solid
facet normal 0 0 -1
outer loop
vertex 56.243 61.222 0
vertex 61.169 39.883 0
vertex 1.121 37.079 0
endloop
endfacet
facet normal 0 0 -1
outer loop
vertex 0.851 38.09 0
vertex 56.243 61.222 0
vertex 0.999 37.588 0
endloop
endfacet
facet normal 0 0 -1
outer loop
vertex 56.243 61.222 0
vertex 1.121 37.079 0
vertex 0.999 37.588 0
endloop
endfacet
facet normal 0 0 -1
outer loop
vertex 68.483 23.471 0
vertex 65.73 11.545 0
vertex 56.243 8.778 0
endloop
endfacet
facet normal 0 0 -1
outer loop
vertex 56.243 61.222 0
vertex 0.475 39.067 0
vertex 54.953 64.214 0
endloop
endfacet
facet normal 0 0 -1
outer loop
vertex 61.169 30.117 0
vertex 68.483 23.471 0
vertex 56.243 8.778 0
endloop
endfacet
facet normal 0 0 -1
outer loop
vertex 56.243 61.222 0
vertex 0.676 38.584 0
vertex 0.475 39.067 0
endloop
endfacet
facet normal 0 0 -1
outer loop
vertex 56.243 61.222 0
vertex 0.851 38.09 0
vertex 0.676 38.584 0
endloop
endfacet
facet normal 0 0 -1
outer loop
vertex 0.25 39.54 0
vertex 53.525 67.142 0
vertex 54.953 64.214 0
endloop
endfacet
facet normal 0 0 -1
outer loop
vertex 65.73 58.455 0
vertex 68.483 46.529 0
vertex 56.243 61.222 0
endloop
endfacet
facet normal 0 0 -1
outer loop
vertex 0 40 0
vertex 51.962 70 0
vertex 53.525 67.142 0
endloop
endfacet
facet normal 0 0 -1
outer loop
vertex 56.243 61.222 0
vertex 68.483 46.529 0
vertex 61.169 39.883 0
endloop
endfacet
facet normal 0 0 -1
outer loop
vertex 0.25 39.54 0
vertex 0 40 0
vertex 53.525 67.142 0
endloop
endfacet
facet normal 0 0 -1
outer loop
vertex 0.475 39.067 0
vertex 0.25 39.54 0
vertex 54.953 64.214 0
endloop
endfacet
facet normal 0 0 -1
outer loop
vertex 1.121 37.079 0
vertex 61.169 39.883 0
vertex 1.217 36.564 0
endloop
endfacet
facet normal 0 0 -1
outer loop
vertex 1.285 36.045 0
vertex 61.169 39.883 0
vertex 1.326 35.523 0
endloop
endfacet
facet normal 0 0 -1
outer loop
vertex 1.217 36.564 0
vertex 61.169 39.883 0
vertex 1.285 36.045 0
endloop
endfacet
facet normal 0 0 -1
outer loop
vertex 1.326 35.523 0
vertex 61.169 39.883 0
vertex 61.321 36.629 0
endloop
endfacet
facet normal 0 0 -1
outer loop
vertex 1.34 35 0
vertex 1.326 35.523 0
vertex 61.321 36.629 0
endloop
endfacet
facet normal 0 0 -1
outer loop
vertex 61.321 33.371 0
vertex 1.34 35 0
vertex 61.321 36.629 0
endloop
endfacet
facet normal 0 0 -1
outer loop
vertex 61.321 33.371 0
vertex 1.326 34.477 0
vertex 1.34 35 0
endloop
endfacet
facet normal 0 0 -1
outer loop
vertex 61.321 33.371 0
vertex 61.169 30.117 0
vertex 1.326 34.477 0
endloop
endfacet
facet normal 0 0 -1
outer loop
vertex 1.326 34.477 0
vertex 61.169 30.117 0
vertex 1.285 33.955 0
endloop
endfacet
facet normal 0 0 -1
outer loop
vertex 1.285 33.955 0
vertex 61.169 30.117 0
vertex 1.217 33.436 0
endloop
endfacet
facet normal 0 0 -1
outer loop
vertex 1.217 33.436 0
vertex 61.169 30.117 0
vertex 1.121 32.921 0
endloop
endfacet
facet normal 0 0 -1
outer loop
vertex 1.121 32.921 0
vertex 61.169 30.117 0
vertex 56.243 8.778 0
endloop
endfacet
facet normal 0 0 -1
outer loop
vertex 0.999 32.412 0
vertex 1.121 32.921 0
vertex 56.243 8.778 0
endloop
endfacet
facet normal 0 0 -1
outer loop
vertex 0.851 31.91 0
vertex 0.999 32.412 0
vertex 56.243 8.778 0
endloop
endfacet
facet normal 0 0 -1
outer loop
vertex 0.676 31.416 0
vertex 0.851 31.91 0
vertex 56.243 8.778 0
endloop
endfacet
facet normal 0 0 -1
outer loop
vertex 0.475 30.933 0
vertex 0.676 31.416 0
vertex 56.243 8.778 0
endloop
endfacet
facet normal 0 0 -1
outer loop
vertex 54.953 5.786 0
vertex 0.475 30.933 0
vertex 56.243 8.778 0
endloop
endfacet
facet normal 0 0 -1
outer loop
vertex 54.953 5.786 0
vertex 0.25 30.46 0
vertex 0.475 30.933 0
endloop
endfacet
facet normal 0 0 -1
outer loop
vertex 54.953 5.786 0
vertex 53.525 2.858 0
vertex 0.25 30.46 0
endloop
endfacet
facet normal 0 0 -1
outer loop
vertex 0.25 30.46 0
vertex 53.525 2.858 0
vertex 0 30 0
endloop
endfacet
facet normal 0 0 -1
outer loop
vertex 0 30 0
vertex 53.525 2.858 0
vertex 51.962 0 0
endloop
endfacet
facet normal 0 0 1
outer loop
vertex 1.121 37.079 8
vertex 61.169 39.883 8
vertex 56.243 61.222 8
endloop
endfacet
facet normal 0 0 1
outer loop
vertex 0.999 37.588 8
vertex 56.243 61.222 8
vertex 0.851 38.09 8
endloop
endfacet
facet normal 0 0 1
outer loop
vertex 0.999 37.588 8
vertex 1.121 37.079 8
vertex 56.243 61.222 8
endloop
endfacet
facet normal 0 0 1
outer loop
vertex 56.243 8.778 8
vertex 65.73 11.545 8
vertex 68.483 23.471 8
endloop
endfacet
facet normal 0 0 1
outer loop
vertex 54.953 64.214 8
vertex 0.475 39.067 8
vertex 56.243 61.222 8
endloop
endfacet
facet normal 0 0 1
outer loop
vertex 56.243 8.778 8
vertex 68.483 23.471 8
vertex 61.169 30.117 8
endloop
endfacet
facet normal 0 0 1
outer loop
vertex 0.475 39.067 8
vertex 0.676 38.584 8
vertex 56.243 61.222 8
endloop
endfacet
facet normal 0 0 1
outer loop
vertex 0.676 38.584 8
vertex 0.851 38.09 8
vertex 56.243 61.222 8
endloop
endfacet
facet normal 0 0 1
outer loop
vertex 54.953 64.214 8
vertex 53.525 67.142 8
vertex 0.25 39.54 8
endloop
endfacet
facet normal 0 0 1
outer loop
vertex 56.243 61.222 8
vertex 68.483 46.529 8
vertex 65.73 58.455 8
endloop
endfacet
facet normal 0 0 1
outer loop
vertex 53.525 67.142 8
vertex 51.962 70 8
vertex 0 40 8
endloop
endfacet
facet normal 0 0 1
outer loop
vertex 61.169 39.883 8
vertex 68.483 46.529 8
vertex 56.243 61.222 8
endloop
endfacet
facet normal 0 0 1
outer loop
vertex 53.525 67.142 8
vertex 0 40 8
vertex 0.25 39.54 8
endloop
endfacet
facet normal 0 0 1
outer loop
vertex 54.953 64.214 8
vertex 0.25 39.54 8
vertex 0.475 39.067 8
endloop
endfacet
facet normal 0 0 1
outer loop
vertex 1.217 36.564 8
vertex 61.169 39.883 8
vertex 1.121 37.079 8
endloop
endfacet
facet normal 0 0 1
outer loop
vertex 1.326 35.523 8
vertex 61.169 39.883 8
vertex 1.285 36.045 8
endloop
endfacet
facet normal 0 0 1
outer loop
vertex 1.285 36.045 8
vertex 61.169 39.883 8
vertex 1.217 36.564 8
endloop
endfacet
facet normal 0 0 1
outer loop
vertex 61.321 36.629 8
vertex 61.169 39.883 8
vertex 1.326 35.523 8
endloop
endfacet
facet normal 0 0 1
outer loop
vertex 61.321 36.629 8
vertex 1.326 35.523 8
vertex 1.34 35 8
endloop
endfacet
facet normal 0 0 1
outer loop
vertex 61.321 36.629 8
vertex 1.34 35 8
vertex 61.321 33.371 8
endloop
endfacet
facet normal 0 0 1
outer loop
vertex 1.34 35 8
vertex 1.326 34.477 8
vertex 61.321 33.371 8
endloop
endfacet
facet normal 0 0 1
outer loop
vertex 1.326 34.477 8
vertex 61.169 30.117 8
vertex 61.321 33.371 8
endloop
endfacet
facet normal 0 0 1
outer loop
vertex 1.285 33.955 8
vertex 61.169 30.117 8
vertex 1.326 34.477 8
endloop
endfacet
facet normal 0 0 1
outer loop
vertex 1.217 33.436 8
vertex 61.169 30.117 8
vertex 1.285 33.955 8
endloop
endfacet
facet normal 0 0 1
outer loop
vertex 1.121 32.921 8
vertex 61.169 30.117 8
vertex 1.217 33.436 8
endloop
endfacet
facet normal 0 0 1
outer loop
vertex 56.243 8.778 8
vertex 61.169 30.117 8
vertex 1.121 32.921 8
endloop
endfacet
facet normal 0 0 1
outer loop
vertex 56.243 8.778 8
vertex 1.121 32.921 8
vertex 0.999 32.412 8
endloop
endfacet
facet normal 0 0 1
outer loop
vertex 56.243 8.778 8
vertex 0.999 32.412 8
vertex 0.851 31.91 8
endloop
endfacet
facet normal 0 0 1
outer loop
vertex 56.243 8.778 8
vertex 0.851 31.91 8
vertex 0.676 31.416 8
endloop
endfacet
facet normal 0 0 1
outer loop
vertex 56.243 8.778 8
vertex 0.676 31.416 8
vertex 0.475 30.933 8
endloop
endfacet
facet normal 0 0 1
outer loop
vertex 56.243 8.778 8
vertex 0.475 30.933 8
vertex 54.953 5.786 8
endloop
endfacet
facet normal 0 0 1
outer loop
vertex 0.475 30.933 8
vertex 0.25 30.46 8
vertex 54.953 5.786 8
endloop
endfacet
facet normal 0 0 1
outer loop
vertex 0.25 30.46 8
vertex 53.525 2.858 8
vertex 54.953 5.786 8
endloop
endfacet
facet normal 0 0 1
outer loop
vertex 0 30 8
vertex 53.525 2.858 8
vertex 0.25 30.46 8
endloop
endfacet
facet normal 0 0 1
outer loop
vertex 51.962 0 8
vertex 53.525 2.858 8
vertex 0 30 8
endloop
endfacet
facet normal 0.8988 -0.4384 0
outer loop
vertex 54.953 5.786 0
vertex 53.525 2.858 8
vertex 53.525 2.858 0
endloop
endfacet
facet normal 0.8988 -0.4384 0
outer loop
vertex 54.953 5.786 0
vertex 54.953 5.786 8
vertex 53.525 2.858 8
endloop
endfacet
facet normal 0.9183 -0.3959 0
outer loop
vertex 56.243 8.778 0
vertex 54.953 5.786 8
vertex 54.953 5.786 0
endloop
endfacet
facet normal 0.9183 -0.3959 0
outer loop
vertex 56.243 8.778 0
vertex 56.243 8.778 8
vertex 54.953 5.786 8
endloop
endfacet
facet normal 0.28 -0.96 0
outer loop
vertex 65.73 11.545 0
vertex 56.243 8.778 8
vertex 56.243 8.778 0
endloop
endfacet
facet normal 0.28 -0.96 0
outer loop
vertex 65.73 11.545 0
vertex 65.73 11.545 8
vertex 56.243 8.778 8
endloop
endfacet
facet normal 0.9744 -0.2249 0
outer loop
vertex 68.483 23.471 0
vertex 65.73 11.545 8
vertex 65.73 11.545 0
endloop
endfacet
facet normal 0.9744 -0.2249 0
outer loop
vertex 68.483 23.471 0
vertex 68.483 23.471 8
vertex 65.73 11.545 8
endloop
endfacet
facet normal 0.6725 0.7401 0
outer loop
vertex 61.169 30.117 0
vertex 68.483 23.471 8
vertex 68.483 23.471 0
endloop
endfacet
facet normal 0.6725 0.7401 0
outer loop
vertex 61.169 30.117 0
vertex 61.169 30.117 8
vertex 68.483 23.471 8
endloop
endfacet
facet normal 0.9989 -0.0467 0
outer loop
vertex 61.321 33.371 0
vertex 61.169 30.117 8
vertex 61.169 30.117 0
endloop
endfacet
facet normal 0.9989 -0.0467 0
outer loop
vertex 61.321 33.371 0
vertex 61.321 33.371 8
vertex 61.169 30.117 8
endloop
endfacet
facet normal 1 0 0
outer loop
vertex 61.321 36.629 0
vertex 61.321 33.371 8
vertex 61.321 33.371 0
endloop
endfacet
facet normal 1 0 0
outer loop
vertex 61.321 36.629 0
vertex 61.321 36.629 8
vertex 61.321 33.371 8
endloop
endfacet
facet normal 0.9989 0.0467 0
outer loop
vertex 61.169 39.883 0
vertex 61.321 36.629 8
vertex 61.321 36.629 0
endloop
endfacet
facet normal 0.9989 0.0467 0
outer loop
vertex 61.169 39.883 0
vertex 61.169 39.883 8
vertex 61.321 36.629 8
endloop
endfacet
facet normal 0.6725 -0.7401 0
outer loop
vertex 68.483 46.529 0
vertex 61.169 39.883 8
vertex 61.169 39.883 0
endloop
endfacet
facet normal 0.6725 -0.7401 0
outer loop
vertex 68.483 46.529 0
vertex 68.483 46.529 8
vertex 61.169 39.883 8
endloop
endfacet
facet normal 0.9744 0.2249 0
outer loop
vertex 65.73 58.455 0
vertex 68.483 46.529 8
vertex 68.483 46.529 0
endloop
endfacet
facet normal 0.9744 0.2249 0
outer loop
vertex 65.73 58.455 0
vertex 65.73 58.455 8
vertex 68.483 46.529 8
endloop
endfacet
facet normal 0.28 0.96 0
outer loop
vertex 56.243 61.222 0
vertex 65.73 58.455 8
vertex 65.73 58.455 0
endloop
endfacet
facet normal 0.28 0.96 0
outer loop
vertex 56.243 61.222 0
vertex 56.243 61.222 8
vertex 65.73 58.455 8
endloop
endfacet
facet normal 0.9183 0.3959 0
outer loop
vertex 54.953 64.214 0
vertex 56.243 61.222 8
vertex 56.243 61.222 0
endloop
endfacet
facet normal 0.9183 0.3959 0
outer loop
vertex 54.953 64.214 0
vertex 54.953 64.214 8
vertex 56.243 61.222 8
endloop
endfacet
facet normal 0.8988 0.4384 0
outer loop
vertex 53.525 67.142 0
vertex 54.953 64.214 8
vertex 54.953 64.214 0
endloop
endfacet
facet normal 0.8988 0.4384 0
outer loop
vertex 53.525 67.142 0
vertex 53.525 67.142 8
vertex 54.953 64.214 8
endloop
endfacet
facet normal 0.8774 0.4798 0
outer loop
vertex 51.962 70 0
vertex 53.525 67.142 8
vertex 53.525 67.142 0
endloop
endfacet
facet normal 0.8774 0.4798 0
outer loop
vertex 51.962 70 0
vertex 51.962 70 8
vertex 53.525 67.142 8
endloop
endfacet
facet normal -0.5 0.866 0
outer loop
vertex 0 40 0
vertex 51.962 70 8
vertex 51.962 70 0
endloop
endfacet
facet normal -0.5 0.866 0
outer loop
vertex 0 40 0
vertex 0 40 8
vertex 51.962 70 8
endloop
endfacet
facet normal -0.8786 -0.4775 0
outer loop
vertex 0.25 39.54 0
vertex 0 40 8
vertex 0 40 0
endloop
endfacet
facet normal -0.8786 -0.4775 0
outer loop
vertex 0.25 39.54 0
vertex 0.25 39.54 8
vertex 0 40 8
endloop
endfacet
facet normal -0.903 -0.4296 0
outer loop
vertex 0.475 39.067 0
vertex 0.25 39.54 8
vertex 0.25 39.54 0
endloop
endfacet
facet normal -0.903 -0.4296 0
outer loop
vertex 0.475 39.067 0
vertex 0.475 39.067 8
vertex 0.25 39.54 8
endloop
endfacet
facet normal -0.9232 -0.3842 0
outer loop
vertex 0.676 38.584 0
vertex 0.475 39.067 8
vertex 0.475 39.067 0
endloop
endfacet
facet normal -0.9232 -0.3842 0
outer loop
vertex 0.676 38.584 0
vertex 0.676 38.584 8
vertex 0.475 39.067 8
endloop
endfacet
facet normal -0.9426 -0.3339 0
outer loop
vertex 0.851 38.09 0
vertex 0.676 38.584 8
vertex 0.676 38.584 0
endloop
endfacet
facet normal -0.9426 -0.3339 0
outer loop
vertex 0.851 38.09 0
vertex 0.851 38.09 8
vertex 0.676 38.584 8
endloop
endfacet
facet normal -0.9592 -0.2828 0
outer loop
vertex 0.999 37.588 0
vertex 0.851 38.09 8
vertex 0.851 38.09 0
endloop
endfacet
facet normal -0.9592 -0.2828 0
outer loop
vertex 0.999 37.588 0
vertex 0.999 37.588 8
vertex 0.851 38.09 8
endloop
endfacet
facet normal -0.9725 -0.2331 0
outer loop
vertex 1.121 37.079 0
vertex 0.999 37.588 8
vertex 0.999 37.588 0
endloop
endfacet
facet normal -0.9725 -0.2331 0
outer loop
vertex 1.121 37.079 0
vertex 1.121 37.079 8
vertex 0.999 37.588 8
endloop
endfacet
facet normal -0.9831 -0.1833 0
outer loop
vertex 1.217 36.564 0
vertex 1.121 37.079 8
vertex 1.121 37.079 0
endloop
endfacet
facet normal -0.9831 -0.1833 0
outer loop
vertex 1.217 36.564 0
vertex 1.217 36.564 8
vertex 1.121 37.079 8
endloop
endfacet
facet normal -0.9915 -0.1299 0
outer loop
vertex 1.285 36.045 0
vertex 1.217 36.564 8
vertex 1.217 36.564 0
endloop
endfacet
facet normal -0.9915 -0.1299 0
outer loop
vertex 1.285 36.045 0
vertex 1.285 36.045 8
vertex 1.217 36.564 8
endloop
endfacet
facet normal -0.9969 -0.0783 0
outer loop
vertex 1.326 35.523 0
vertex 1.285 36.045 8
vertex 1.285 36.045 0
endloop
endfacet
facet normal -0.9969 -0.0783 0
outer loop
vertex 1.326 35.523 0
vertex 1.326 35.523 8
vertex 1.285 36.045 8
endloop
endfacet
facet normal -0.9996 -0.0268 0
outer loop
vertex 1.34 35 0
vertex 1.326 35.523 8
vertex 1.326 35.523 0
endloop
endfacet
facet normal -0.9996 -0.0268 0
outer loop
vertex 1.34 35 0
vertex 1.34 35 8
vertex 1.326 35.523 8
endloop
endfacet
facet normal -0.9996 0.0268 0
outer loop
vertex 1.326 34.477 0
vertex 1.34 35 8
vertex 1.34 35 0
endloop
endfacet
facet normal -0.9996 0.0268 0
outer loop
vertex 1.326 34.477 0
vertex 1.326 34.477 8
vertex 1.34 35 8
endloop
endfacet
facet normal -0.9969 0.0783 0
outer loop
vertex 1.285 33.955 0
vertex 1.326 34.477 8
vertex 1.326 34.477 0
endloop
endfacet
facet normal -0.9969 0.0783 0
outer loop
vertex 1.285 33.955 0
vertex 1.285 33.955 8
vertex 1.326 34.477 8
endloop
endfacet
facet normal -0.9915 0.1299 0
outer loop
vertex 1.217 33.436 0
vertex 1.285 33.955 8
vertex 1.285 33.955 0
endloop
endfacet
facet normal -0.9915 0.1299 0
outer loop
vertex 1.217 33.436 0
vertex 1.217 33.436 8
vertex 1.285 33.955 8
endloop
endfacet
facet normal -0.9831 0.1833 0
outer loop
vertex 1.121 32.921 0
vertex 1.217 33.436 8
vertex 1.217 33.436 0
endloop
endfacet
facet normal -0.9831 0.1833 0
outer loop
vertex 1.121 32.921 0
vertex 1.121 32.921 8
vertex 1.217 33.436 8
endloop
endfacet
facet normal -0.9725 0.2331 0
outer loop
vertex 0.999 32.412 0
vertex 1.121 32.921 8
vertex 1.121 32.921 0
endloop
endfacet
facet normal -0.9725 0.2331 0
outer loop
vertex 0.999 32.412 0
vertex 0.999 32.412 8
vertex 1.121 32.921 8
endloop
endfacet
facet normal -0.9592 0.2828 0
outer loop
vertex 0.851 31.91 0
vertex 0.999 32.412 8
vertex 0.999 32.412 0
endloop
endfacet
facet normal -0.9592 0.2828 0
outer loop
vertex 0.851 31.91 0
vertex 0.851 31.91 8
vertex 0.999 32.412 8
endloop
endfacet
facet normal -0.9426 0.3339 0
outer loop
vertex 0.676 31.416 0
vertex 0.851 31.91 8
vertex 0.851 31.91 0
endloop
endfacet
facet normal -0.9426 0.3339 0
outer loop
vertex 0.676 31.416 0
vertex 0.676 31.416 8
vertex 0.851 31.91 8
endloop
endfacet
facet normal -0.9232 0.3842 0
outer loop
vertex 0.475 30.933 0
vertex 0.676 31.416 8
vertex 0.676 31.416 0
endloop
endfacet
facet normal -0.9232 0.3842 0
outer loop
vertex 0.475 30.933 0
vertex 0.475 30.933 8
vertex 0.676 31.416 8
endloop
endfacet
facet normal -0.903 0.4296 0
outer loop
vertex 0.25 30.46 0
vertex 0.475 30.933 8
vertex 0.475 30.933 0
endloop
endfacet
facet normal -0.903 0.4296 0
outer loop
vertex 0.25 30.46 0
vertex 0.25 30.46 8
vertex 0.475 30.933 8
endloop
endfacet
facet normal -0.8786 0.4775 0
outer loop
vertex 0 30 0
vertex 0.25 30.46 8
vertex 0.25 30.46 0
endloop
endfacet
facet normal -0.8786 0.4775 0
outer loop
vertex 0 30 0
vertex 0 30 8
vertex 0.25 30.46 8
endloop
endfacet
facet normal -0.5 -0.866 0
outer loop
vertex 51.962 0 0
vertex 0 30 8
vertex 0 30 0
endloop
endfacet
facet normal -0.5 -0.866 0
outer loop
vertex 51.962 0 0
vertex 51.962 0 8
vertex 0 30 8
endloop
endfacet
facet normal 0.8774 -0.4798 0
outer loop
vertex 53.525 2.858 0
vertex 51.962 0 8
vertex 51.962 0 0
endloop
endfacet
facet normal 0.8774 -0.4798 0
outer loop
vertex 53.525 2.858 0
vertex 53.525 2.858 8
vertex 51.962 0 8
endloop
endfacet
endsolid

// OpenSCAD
$fn = 32;

// ----------------------------------------------------------------------
// Gear sector: 2 teeth on 60 degrees
// ----------------------------------------------------------------------

// --- parameters (mm) ---
sector_angle = 60;        // sector angle, degrees
root_r = 70;              // root circle radius
tooth_h = 8;              // tooth height over the root circle
teeth = 2;                // number of teeth on the sector
hub_r = 10;               // hub bore radius
plate_t = 8;              // sector thickness, Z
arc_step = 3;             // sampling step of the root/hub arcs, degrees

tip_r = root_r + tooth_h;  // tip circle radius

profile = [[51.962, 0], [53.525, 2.858], [54.953, 5.786], [56.243, 8.778], [65.73, 11.545], [68.483, 23.471], [61.169, 30.117], [61.321, 33.371], [61.321, 36.629], [61.169, 39.883], [68.483, 46.529], [65.73, 58.455], [56.243, 61.222], [54.953, 64.214], [53.525, 67.142], [51.962, 70], [0, 40], [0.25, 39.54], [0.475, 39.067], [0.676, 38.584], [0.851, 38.09], [0.999, 37.588], [1.121, 37.079], [1.217, 36.564], [1.285, 36.045], [1.326, 35.523], [1.34, 35], [1.326, 34.477], [1.285, 33.955], [1.217, 33.436], [1.121, 32.921], [0.999, 32.412], [0.851, 31.91], [0.676, 31.416], [0.475, 30.933], [0.25, 30.46], [0, 30]];  // primary outline, 37 points, counter clockwise

// --- the one profile operation ---
linear_extrude(height = plate_t) polygon(points = profile);
